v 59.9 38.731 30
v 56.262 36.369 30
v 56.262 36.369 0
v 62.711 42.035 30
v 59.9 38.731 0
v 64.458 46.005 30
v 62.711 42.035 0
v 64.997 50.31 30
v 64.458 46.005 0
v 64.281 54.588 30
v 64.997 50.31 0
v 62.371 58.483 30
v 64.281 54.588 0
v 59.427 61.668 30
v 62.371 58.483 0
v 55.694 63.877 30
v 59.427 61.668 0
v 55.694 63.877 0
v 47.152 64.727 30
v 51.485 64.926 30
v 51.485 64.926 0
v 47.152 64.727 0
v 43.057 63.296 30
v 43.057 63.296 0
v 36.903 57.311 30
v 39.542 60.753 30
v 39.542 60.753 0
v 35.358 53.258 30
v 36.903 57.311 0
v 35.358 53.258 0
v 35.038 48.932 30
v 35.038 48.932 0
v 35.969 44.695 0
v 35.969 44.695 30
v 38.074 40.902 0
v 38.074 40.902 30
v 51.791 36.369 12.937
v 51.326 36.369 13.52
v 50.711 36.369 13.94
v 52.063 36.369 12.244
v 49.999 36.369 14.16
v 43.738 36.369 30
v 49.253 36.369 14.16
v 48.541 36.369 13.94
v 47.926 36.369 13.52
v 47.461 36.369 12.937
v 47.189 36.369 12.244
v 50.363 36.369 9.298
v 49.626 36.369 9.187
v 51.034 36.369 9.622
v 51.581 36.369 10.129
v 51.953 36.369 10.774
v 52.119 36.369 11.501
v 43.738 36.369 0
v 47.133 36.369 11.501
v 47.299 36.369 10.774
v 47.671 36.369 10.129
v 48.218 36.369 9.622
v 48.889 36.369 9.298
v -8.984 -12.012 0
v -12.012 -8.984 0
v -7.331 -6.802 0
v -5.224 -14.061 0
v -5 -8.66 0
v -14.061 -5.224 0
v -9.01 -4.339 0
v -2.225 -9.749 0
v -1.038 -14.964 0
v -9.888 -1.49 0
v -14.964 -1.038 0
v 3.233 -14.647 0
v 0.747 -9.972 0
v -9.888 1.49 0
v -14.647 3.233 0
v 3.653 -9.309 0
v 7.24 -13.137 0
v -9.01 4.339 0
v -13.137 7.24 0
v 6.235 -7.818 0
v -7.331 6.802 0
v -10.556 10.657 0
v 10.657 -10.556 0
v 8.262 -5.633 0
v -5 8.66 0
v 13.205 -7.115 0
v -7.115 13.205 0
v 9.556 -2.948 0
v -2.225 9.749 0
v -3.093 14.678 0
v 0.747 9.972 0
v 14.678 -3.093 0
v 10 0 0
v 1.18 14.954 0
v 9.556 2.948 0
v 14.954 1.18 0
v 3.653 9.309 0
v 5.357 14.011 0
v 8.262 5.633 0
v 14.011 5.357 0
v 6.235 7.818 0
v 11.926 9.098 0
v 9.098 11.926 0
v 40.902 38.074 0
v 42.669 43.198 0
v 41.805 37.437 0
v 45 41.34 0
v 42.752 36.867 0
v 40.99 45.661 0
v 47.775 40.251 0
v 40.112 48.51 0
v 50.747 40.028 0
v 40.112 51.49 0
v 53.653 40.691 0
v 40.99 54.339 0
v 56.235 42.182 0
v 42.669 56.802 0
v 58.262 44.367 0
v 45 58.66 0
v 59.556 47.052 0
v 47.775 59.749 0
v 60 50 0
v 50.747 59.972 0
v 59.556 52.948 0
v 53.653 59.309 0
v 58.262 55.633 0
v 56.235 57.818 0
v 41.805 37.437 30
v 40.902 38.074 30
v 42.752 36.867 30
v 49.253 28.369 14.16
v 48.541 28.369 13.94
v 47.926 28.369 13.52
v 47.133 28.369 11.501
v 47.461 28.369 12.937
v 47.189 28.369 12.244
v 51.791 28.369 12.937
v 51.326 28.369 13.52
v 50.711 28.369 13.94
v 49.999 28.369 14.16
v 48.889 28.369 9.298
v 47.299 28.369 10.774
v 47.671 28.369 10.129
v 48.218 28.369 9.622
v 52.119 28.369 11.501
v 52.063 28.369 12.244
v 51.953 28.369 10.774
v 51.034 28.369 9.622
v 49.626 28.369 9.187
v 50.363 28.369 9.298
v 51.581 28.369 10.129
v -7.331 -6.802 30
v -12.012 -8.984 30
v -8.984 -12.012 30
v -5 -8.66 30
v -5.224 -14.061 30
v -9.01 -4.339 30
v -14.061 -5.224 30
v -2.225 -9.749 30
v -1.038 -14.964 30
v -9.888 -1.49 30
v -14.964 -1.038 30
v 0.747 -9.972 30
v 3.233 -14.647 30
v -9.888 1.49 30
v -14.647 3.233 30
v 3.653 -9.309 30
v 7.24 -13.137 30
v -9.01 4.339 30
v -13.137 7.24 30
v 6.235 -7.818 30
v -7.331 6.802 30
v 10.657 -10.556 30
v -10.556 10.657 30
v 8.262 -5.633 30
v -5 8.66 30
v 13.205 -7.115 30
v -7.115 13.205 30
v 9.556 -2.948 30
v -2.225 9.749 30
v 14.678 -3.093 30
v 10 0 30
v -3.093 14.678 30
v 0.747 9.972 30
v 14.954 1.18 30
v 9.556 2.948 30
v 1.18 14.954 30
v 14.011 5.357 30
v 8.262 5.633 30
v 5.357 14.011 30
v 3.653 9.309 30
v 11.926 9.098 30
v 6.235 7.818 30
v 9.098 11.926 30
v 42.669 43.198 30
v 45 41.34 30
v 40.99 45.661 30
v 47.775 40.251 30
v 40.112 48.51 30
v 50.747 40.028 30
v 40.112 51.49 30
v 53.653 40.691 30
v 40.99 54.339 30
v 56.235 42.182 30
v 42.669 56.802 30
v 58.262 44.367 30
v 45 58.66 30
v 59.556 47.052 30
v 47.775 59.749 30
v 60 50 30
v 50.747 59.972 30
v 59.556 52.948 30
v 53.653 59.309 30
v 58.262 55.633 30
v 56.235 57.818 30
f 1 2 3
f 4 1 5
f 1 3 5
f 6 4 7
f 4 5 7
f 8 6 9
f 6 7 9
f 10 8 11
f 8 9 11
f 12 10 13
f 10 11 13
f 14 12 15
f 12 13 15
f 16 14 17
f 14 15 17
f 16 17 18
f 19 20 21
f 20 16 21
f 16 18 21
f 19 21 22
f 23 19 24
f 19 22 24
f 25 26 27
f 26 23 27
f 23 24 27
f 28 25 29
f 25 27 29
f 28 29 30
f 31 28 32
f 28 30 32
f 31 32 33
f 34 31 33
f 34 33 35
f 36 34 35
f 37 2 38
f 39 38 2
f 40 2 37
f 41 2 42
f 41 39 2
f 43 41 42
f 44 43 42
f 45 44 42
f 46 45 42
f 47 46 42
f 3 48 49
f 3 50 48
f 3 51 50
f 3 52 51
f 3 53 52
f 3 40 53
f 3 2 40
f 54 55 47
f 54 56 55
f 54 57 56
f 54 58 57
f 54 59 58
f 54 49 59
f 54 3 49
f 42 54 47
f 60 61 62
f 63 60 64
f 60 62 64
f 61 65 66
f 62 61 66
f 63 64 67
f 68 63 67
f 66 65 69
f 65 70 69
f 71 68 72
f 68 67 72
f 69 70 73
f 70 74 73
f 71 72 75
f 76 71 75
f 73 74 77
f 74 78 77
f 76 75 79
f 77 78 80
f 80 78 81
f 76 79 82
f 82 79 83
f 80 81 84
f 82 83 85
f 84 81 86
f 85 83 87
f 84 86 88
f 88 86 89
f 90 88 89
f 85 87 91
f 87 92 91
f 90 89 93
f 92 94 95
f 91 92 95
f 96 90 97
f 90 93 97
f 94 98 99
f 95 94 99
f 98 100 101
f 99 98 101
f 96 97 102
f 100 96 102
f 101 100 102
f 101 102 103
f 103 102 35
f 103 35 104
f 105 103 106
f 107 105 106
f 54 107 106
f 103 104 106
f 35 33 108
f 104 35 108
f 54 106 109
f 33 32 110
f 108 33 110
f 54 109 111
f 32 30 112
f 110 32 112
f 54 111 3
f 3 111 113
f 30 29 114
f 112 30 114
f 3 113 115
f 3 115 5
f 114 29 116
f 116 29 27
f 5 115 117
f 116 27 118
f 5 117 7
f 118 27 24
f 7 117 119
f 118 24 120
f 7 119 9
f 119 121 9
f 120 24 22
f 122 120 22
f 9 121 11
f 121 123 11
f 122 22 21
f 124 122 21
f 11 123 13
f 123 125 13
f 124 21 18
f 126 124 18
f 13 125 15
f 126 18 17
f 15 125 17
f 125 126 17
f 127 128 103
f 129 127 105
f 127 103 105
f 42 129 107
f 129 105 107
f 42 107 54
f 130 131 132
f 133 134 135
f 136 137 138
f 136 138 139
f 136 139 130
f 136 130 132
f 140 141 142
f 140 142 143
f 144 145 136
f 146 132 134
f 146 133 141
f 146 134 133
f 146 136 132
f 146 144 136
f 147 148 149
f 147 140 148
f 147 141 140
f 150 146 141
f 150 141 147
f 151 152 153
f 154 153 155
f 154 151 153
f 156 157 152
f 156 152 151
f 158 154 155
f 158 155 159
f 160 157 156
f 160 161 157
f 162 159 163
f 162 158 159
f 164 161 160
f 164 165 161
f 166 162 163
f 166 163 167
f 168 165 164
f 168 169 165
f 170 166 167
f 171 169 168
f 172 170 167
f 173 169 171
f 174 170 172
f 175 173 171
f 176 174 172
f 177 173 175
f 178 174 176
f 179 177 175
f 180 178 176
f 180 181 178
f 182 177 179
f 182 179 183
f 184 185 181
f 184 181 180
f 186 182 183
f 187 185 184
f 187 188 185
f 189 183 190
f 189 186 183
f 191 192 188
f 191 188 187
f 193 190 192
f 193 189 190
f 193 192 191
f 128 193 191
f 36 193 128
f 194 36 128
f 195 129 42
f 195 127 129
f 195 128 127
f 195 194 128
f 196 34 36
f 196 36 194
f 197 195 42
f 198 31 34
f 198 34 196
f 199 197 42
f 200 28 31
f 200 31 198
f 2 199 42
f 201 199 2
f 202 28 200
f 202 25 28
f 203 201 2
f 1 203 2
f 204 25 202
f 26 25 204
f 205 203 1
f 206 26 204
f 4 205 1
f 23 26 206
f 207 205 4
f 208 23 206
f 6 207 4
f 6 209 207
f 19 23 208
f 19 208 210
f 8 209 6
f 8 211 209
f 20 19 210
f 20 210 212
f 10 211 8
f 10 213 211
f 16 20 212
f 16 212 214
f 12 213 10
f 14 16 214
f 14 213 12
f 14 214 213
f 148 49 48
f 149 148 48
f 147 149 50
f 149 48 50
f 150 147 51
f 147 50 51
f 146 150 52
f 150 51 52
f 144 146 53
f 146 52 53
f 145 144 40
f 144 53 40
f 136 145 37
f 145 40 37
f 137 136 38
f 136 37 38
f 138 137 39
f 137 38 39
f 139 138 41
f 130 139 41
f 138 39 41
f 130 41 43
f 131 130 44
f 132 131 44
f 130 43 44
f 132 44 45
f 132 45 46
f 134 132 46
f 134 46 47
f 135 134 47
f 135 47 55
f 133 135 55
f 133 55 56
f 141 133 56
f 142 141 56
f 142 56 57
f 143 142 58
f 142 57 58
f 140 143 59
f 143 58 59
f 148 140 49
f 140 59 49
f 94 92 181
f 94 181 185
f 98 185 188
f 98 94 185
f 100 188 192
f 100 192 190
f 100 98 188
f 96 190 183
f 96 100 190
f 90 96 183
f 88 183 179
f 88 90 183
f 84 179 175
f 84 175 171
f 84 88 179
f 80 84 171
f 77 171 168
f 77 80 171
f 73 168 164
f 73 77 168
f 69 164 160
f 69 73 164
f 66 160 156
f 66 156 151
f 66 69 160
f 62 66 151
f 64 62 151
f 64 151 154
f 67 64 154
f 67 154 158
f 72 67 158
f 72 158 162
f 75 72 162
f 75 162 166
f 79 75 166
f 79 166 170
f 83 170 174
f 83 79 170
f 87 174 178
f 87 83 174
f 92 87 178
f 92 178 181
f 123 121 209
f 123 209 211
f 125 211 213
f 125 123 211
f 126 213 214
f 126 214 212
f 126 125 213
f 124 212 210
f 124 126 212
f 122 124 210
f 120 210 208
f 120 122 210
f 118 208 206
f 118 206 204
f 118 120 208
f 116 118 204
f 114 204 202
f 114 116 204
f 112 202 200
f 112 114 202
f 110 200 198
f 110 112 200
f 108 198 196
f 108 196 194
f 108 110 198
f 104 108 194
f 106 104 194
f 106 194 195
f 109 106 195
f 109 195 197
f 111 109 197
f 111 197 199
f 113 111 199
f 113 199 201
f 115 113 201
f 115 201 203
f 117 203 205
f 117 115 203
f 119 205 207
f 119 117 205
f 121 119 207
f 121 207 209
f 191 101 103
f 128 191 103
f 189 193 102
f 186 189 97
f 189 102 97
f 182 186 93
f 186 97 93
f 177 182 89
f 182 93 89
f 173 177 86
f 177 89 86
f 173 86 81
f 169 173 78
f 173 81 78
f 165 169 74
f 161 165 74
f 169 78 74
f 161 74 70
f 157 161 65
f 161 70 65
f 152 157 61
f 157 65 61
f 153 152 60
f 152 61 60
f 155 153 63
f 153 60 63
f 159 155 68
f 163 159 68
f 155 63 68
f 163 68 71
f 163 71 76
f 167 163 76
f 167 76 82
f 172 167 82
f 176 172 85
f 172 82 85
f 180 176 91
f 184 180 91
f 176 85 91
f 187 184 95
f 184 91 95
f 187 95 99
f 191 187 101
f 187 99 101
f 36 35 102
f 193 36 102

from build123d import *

# Parameters (mm, degrees)
SKETCH_1_R          = 15
SKETCH_1_R_2        = 10
EXTRUDE_1_DEPTH     = 30
CUT_EXTRUDE_START   = -30
CUT_EXTRUDE_1_DEPTH = 30
SKETCH_3_R          = 2.5
EXTRUDE_2_DEPTH     = 8


# Read off the part's stored shape, not the designer's step: 切除-拉伸1
with BuildPart() as part:
    # 草图1 → 凸台-拉伸1 (new body)
    # profile 1 of 3: a face of its own
    with BuildSketch(Plane.XY):
        Circle(SKETCH_1_R)
        Circle(SKETCH_1_R_2, mode=Mode.SUBTRACT)
    # profile 2 of 3: a face of its own
    with BuildSketch(Plane.XY):
        with BuildLine():
            ThreePointArc((40.902315542, 38.073888417), (39.393398282, 39.393398282), (38.073888417, 40.902315542))
            Line((38.073888417, 40.902315542), (9.097684458, 11.926111583))
            ThreePointArc((9.097684458, 11.926111583), (10.606601718, 10.606601718), (11.926111583, 9.097684458))
            Line((11.926111583, 9.097684458), (40.902315542, 38.073888417))
        make_face()
    # profile 3 of 3: a face of its own
    with BuildSketch(Plane.XY):
        with Locations((50, 50)):
            Circle(SKETCH_1_R)
        with Locations((50, 50)):
            Circle(SKETCH_1_R_2, mode=Mode.SUBTRACT)
    extrude(amount=EXTRUDE_1_DEPTH)

    # 切除-拉伸1 outline → 切除-拉伸1 (cut)
    with BuildSketch(Plane.XY.offset(30).offset(CUT_EXTRUDE_START)):
        with BuildLine():
            Line((56.261708011, 36.3694823), (43.738291989, 36.3694823))
            ThreePointArc((43.738291989, 36.3694823), (50, 35), (56.261708011, 36.3694823))
        make_face()
    extrude(amount=CUT_EXTRUDE_1_DEPTH, mode=Mode.SUBTRACT)

    # 草图3 → 凸台-拉伸2 (add)
    with BuildSketch(Plane(origin=(0, 36.369482299, 0), x_dir=(-1, 0, 0), z_dir=(0, -1, 0))):
        with Locations(Location((-49.626061582, -11.687427951, 0), (0, 0, 90))):
            Circle(SKETCH_3_R)
    extrude(amount=EXTRUDE_2_DEPTH)


solid = part.part
